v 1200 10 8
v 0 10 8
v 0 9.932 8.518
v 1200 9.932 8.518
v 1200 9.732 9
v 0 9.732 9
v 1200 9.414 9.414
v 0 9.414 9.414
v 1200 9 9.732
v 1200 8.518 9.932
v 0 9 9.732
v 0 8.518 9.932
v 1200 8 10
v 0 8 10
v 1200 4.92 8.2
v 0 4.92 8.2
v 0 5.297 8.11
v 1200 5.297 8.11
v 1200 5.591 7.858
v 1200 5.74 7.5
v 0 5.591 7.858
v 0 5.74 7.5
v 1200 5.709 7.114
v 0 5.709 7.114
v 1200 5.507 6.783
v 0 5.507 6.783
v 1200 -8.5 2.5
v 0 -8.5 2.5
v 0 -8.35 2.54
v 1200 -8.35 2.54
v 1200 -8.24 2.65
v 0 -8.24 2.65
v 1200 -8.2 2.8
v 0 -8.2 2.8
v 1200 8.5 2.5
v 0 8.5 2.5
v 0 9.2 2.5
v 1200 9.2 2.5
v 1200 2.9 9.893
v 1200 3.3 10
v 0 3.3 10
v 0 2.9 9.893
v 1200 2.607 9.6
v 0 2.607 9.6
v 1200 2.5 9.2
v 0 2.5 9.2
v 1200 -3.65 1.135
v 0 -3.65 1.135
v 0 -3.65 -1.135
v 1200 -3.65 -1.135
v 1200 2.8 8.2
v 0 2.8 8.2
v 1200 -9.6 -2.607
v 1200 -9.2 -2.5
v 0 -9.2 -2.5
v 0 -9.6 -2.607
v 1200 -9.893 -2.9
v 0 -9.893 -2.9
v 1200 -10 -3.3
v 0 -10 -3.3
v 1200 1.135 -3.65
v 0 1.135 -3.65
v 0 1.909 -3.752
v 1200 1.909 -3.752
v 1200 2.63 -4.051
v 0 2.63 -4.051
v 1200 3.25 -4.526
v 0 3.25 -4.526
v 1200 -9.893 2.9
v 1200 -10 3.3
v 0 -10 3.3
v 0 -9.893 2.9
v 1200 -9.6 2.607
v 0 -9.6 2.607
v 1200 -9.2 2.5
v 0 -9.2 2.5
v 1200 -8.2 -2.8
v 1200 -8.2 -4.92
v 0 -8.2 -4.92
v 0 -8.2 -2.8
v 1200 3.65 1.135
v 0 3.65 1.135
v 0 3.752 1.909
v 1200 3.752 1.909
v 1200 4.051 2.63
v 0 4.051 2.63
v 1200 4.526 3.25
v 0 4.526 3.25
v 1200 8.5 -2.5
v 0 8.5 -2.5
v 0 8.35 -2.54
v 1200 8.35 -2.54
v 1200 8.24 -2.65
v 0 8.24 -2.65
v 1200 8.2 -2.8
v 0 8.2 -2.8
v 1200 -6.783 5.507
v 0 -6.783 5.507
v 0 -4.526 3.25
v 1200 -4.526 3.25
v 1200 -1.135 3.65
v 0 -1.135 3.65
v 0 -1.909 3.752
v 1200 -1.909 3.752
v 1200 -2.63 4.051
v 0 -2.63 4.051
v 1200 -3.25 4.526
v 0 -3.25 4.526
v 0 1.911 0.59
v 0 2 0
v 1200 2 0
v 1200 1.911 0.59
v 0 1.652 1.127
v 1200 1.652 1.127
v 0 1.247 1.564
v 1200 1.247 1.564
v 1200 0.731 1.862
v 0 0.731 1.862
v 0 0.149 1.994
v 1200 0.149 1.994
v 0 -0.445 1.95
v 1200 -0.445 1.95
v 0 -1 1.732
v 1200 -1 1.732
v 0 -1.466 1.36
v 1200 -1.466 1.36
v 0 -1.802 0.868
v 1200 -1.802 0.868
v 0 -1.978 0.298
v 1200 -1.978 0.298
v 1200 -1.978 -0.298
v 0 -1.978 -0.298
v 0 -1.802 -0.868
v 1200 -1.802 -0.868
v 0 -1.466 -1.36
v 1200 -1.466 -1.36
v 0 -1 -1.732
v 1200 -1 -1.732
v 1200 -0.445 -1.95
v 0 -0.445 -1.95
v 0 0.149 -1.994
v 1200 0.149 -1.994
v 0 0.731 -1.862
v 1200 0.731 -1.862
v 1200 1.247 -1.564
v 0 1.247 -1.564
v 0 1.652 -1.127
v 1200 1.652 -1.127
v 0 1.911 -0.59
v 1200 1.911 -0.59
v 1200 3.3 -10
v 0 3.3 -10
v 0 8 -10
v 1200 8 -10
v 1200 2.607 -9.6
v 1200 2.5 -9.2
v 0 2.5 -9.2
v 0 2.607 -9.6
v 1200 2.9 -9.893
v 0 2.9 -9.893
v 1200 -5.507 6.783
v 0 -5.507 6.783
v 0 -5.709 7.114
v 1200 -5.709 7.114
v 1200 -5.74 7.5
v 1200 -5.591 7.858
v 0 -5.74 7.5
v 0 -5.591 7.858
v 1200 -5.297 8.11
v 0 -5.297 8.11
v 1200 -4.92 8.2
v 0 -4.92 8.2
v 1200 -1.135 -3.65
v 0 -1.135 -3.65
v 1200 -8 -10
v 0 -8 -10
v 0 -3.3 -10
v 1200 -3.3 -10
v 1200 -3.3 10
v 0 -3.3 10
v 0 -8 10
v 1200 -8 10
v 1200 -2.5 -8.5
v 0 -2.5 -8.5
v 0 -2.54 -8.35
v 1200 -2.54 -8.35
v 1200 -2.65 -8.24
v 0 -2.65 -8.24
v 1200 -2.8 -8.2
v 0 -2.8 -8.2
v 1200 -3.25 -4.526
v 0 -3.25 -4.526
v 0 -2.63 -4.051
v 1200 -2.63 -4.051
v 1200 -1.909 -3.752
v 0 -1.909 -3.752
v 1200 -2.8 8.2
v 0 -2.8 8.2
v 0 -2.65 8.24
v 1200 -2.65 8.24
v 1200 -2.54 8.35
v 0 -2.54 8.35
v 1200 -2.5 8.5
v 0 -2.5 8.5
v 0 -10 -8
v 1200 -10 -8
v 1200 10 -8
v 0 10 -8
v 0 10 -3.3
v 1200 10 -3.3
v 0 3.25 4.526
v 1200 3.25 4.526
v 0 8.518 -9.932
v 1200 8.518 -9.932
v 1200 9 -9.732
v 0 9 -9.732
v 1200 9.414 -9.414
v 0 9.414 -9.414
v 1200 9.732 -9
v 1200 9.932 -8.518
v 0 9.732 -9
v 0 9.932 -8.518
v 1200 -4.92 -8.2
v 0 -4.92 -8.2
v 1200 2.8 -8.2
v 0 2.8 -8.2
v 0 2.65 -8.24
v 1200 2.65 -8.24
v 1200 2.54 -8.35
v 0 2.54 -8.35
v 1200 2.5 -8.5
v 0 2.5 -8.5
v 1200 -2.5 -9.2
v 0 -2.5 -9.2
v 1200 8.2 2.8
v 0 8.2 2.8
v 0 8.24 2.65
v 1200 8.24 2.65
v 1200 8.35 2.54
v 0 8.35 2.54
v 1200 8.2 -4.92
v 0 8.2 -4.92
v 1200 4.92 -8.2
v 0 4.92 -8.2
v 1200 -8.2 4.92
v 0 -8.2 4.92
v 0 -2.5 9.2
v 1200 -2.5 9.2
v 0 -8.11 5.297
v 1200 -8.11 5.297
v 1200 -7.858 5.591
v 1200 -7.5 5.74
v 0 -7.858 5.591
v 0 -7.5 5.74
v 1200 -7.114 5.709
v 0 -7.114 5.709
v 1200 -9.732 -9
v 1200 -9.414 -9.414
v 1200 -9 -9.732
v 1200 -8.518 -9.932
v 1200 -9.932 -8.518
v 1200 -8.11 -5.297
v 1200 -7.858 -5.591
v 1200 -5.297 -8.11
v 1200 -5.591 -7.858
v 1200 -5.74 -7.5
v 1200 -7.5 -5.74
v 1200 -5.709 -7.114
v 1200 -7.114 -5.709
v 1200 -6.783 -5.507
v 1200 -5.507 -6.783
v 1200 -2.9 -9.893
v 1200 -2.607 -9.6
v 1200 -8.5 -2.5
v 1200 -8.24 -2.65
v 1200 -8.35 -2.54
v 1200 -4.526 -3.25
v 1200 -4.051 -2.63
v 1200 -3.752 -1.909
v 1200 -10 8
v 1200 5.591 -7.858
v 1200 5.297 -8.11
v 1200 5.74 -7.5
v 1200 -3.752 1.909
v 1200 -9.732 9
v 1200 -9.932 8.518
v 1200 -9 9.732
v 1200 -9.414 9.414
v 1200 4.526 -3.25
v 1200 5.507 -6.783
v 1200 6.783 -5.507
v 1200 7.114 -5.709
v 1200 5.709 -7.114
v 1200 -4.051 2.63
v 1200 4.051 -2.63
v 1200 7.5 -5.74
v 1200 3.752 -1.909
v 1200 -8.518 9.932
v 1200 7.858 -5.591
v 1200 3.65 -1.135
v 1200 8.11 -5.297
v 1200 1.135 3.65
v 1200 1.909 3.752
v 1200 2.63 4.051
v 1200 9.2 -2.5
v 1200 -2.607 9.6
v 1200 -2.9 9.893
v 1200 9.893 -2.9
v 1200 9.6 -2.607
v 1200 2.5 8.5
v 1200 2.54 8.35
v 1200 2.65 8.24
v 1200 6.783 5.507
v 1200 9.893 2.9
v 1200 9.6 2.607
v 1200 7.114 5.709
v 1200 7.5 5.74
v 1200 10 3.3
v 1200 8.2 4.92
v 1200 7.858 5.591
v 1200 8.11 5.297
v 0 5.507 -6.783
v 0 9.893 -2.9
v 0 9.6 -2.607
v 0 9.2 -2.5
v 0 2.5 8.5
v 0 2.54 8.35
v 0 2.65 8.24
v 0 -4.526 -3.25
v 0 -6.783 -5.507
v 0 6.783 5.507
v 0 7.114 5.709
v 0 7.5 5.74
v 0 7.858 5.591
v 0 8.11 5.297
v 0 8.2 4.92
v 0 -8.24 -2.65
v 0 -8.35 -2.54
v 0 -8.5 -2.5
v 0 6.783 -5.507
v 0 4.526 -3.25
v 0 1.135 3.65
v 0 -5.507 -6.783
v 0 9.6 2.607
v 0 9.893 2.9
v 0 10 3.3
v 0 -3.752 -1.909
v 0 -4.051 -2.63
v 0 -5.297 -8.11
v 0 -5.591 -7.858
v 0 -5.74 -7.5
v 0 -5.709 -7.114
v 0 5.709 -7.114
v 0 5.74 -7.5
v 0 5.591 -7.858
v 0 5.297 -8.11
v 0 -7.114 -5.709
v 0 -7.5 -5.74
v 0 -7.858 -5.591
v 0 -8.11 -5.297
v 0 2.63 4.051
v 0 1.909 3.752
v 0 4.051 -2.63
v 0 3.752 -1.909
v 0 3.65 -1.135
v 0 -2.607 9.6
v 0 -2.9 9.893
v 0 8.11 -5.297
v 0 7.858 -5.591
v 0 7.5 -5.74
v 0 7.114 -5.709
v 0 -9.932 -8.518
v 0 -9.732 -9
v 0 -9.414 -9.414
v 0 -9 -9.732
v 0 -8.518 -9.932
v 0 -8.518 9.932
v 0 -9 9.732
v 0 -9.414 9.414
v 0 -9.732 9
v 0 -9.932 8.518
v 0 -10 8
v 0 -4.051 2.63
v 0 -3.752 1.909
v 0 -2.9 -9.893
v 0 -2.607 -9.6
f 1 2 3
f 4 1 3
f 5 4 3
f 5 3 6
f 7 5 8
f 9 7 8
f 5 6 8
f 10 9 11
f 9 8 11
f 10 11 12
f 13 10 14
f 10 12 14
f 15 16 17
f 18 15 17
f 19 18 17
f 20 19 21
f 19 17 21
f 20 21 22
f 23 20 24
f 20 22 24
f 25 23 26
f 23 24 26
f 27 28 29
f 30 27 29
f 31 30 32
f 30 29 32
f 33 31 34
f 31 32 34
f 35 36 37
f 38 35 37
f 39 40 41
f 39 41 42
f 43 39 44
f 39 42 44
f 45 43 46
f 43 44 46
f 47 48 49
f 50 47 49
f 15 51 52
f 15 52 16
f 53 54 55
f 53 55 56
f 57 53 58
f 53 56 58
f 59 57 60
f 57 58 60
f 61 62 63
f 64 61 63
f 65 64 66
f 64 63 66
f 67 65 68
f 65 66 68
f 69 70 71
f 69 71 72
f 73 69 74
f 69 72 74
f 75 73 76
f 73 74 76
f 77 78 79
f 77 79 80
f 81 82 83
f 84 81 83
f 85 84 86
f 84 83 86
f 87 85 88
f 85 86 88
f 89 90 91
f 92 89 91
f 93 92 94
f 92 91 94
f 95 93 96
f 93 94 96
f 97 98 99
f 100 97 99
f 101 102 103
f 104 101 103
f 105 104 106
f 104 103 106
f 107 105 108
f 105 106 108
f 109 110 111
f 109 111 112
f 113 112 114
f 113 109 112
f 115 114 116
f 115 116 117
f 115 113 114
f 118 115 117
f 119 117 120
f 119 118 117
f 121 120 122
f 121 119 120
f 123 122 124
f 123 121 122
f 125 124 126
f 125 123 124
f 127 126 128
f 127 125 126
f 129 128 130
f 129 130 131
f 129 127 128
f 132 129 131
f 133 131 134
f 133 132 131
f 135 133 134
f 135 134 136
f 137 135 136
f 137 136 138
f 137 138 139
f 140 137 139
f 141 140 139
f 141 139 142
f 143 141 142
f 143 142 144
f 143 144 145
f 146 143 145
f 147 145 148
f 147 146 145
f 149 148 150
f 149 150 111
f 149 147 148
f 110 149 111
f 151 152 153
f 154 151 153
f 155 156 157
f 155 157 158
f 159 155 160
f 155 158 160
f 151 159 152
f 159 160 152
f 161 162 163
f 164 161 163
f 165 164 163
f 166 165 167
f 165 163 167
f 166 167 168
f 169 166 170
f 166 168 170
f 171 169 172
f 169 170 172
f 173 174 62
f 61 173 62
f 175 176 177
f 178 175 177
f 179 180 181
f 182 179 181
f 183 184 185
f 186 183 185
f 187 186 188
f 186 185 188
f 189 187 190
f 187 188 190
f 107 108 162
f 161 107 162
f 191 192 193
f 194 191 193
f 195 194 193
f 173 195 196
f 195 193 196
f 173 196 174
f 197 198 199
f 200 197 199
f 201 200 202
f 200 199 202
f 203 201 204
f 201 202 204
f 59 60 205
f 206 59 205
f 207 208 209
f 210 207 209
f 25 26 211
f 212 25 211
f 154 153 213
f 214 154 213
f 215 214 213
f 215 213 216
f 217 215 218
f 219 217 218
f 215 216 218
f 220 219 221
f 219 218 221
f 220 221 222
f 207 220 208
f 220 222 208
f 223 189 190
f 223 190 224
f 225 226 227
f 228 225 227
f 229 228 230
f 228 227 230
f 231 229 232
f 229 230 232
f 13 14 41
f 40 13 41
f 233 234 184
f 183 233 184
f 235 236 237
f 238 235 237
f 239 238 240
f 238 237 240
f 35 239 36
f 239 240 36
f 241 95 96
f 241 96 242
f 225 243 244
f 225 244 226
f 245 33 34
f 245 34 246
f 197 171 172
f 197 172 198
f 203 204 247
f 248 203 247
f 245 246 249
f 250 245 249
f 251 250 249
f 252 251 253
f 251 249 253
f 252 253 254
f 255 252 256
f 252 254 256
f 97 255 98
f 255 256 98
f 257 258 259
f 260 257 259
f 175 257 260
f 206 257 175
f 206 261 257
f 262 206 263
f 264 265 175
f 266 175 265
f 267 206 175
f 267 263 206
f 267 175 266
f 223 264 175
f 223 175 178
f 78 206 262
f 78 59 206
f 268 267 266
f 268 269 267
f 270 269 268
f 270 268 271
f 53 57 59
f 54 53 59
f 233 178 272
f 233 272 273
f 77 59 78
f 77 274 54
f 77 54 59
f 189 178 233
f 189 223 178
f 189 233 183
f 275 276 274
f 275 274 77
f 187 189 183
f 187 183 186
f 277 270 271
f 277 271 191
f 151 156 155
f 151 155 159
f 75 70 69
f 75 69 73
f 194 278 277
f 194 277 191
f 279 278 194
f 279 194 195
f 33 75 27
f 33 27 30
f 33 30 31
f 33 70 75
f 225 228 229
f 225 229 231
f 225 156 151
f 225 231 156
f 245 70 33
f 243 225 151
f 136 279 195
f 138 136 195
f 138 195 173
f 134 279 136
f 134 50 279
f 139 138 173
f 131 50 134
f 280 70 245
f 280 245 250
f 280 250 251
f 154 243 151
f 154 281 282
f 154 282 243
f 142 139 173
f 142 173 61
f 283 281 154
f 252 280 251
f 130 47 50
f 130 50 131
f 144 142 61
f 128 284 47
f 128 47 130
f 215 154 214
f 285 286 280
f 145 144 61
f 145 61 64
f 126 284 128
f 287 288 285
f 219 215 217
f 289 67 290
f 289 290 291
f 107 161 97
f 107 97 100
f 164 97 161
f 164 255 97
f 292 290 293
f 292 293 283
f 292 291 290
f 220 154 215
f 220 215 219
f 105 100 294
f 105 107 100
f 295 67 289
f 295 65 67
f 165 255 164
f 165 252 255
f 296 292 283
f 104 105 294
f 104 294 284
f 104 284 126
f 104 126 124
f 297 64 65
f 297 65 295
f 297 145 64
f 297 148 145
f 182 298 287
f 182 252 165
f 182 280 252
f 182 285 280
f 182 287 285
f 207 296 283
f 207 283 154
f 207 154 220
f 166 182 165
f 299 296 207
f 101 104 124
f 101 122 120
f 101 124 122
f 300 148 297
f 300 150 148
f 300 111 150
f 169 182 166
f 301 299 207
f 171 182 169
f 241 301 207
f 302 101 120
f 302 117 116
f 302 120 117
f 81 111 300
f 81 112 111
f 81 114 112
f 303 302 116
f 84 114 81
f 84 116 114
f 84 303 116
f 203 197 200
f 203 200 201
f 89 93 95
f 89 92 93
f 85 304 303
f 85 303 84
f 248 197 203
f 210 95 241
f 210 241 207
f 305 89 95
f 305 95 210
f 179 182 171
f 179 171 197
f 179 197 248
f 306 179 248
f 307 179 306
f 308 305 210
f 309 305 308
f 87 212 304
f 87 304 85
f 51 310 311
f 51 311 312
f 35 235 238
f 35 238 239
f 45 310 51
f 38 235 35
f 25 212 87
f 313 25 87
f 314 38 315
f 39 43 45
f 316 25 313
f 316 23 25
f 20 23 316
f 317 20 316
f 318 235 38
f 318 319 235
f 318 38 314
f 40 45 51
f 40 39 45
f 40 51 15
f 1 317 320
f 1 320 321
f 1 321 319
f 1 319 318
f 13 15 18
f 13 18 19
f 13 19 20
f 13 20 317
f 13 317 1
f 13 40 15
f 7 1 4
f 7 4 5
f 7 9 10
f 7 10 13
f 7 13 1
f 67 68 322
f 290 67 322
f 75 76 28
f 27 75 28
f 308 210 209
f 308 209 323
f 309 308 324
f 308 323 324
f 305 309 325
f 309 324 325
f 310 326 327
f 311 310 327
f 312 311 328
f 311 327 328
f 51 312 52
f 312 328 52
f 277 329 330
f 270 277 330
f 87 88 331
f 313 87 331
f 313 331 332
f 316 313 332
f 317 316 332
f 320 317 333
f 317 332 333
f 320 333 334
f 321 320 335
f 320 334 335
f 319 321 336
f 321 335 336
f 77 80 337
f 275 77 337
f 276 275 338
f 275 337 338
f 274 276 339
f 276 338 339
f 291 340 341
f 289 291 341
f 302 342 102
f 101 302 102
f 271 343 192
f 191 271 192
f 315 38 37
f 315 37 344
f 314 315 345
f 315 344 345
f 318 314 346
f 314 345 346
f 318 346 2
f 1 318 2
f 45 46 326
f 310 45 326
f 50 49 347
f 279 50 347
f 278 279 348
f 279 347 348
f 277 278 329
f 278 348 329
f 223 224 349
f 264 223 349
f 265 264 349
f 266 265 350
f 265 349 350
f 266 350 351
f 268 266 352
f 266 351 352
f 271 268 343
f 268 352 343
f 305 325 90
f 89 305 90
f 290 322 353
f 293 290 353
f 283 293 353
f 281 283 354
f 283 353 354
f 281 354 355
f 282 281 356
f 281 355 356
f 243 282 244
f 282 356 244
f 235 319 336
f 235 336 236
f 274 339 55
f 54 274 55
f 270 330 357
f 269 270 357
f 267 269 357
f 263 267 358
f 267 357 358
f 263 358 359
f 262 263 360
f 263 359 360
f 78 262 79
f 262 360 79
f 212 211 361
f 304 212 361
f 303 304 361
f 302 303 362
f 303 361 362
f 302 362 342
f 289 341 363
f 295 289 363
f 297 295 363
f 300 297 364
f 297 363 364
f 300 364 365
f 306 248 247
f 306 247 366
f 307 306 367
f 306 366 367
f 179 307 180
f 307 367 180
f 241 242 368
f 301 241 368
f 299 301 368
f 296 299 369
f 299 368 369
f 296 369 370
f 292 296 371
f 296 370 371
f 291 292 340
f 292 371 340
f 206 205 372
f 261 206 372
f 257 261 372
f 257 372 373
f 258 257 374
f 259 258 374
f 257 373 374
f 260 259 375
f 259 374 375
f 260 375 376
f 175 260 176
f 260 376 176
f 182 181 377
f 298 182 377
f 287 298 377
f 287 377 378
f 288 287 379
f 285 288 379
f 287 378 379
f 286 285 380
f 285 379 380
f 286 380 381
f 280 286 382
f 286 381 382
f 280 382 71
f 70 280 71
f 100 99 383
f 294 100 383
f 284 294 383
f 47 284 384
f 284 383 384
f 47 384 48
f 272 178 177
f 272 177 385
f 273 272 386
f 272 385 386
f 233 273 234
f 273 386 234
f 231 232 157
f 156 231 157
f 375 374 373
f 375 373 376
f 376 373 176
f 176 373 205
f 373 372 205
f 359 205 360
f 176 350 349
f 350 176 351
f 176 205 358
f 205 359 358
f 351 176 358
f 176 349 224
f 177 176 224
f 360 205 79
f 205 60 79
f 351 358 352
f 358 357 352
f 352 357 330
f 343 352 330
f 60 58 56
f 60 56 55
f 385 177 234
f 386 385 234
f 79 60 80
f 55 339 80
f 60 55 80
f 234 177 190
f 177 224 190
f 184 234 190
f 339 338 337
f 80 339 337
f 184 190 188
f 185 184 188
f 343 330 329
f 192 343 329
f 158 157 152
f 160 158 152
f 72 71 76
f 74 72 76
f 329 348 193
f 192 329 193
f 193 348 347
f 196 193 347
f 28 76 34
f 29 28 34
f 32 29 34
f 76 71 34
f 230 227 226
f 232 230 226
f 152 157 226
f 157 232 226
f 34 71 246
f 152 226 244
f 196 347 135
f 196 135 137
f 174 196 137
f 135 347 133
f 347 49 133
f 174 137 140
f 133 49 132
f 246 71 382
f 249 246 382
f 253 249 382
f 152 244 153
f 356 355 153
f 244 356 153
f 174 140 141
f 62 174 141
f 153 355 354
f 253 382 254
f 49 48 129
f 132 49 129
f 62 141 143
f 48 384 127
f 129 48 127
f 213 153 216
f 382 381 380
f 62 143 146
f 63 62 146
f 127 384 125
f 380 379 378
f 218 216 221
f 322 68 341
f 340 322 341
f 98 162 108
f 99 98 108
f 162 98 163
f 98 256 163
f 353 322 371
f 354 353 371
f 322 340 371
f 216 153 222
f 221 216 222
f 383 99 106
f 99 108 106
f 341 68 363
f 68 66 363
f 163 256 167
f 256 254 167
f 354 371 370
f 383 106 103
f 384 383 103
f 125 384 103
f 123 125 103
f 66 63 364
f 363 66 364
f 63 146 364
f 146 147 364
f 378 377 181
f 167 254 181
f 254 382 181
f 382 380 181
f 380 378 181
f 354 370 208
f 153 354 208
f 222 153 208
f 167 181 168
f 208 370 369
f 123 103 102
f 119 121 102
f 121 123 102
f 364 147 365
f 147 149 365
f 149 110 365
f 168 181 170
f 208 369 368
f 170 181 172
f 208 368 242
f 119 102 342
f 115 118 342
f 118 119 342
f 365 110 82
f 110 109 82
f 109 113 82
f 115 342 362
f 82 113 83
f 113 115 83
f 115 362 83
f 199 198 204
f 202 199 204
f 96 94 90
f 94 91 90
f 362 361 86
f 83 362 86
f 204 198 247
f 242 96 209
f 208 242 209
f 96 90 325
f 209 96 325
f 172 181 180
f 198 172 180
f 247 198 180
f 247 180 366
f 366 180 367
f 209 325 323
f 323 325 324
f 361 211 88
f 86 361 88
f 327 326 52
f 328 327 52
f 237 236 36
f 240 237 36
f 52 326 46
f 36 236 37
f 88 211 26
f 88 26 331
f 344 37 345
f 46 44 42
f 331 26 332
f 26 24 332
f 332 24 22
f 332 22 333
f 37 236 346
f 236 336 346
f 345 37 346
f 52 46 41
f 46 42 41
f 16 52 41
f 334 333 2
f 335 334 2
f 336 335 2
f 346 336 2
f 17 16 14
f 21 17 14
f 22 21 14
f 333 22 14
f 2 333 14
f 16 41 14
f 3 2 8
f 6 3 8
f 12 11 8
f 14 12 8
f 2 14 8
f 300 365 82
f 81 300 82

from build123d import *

# Parameters (mm, degrees)
F0_R     = 2
F1_DEPTH = 1200


with BuildPart() as f1:
    # F0 (on Right) → F1 (new body)
    with BuildSketch(Plane.YZ):
        with BuildLine():
            Line((-3.3, 10), (-8, 10))
            ThreePointArc((-8, 10), (-9.414214, 9.414214), (-10, 8))
            Line((-10, 8), (-10, 3.3))
            ThreePointArc((-10, 3.3), (-9.765685, 2.734315), (-9.2, 2.5))
            Line((-9.2, 2.5), (-8.5, 2.5))
            ThreePointArc((-8.5, 2.5), (-8.287868, 2.587868), (-8.2, 2.8))
            Line((-8.2, 2.8), (-8.2, 4.92))
            ThreePointArc((-8.2, 4.92), (-7.687627, 5.68682), (-6.783101, 5.506899))
            Line((-6.783101, 5.506899), (-4.525962, 3.249759))
            ThreePointArc((-4.525962, 3.249759), (-3.877655, 2.279499), (-3.65, 1.135))
            Line((-3.65, 1.135), (-3.65, -1.135))
            ThreePointArc((-3.65, -1.135), (-3.877655, -2.279499), (-4.525962, -3.249759))
            Line((-4.525962, -3.249759), (-6.783101, -5.506899))
            ThreePointArc((-6.783101, -5.506899), (-7.687627, -5.68682), (-8.2, -4.92))
            Line((-8.2, -4.92), (-8.2, -2.8))
            ThreePointArc((-8.2, -2.8), (-8.287868, -2.587868), (-8.5, -2.5))
            Line((-8.5, -2.5), (-9.2, -2.5))
            ThreePointArc((-9.2, -2.5), (-9.765685, -2.734315), (-10, -3.3))
            Line((-10, -3.3), (-10, -8))
            ThreePointArc((-10, -8), (-9.414214, -9.414214), (-8, -10))
            Line((-8, -10), (-3.3, -10))
            ThreePointArc((-3.3, -10), (-2.734315, -9.765685), (-2.5, -9.2))
            Line((-2.5, -9.2), (-2.5, -8.5))
            ThreePointArc((-2.5, -8.5), (-2.587868, -8.287868), (-2.8, -8.2))
            Line((-2.8, -8.2), (-4.92, -8.2))
            ThreePointArc((-4.92, -8.2), (-5.68682, -7.687627), (-5.506899, -6.783101))
            Line((-5.506899, -6.783101), (-3.249759, -4.525962))
            ThreePointArc((-3.249759, -4.525962), (-2.279499, -3.877655), (-1.135, -3.65))
            Line((-1.135, -3.65), (1.135, -3.65))
            ThreePointArc((1.135, -3.65), (2.279499, -3.877655), (3.249759, -4.525962))
            Line((3.249759, -4.525962), (5.506899, -6.783101))
            ThreePointArc((5.506899, -6.783101), (5.68682, -7.687627), (4.92, -8.2))
            Line((4.92, -8.2), (2.8, -8.2))
            ThreePointArc((2.8, -8.2), (2.587868, -8.287868), (2.5, -8.5))
            Line((2.5, -8.5), (2.5, -9.2))
            ThreePointArc((2.5, -9.2), (2.734315, -9.765685), (3.3, -10))
            Line((3.3, -10), (8, -10))
            ThreePointArc((8, -10), (9.414214, -9.414214), (10, -8))
            Line((10, -8), (10, -3.3))
            ThreePointArc((10, -3.3), (9.765685, -2.734315), (9.2, -2.5))
            Line((9.2, -2.5), (8.5, -2.5))
            ThreePointArc((8.5, -2.5), (8.287868, -2.587868), (8.2, -2.8))
            Line((8.2, -2.8), (8.2, -4.92))
            ThreePointArc((8.2, -4.92), (7.687627, -5.68682), (6.783101, -5.506899))
            Line((6.783101, -5.506899), (4.525962, -3.249759))
            ThreePointArc((4.525962, -3.249759), (3.877655, -2.279499), (3.65, -1.135))
            Line((3.65, -1.135), (3.65, 1.135))
            ThreePointArc((3.65, 1.135), (3.877655, 2.279499), (4.525962, 3.249759))
            Line((4.525962, 3.249759), (6.783101, 5.506899))
            ThreePointArc((6.783101, 5.506899), (7.687627, 5.68682), (8.2, 4.92))
            Line((8.2, 4.92), (8.2, 2.8))
            ThreePointArc((8.2, 2.8), (8.287868, 2.587868), (8.5, 2.5))
            Line((8.5, 2.5), (9.2, 2.5))
            ThreePointArc((9.2, 2.5), (9.765685, 2.734315), (10, 3.3))
            Line((10, 3.3), (10, 8))
            ThreePointArc((10, 8), (9.414214, 9.414214), (8, 10))
            Line((8, 10), (3.3, 10))
            ThreePointArc((3.3, 10), (2.734315, 9.765685), (2.5, 9.2))
            Line((2.5, 9.2), (2.5, 8.5))
            ThreePointArc((2.5, 8.5), (2.587868, 8.287868), (2.8, 8.2))
            Line((2.8, 8.2), (4.92, 8.2))
            ThreePointArc((4.92, 8.2), (5.68682, 7.687627), (5.506899, 6.783101))
            Line((5.506899, 6.783101), (3.249759, 4.525962))
            ThreePointArc((3.249759, 4.525962), (2.279499, 3.877655), (1.135, 3.65))
            Line((1.135, 3.65), (-1.135, 3.65))
            ThreePointArc((-1.135, 3.65), (-2.279499, 3.877655), (-3.249759, 4.525962))
            Line((-3.249759, 4.525962), (-5.506899, 6.783101))
            ThreePointArc((-5.506899, 6.783101), (-5.68682, 7.687627), (-4.92, 8.2))
            Line((-4.92, 8.2), (-2.8, 8.2))
            ThreePointArc((-2.8, 8.2), (-2.587868, 8.287868), (-2.5, 8.5))
            Line((-2.5, 8.5), (-2.5, 9.2))
            ThreePointArc((-2.5, 9.2), (-2.734315, 9.765685), (-3.3, 10))
        make_face()
        Circle(F0_R, mode=Mode.SUBTRACT)
    extrude(amount=F1_DEPTH)


solid = f1.part
